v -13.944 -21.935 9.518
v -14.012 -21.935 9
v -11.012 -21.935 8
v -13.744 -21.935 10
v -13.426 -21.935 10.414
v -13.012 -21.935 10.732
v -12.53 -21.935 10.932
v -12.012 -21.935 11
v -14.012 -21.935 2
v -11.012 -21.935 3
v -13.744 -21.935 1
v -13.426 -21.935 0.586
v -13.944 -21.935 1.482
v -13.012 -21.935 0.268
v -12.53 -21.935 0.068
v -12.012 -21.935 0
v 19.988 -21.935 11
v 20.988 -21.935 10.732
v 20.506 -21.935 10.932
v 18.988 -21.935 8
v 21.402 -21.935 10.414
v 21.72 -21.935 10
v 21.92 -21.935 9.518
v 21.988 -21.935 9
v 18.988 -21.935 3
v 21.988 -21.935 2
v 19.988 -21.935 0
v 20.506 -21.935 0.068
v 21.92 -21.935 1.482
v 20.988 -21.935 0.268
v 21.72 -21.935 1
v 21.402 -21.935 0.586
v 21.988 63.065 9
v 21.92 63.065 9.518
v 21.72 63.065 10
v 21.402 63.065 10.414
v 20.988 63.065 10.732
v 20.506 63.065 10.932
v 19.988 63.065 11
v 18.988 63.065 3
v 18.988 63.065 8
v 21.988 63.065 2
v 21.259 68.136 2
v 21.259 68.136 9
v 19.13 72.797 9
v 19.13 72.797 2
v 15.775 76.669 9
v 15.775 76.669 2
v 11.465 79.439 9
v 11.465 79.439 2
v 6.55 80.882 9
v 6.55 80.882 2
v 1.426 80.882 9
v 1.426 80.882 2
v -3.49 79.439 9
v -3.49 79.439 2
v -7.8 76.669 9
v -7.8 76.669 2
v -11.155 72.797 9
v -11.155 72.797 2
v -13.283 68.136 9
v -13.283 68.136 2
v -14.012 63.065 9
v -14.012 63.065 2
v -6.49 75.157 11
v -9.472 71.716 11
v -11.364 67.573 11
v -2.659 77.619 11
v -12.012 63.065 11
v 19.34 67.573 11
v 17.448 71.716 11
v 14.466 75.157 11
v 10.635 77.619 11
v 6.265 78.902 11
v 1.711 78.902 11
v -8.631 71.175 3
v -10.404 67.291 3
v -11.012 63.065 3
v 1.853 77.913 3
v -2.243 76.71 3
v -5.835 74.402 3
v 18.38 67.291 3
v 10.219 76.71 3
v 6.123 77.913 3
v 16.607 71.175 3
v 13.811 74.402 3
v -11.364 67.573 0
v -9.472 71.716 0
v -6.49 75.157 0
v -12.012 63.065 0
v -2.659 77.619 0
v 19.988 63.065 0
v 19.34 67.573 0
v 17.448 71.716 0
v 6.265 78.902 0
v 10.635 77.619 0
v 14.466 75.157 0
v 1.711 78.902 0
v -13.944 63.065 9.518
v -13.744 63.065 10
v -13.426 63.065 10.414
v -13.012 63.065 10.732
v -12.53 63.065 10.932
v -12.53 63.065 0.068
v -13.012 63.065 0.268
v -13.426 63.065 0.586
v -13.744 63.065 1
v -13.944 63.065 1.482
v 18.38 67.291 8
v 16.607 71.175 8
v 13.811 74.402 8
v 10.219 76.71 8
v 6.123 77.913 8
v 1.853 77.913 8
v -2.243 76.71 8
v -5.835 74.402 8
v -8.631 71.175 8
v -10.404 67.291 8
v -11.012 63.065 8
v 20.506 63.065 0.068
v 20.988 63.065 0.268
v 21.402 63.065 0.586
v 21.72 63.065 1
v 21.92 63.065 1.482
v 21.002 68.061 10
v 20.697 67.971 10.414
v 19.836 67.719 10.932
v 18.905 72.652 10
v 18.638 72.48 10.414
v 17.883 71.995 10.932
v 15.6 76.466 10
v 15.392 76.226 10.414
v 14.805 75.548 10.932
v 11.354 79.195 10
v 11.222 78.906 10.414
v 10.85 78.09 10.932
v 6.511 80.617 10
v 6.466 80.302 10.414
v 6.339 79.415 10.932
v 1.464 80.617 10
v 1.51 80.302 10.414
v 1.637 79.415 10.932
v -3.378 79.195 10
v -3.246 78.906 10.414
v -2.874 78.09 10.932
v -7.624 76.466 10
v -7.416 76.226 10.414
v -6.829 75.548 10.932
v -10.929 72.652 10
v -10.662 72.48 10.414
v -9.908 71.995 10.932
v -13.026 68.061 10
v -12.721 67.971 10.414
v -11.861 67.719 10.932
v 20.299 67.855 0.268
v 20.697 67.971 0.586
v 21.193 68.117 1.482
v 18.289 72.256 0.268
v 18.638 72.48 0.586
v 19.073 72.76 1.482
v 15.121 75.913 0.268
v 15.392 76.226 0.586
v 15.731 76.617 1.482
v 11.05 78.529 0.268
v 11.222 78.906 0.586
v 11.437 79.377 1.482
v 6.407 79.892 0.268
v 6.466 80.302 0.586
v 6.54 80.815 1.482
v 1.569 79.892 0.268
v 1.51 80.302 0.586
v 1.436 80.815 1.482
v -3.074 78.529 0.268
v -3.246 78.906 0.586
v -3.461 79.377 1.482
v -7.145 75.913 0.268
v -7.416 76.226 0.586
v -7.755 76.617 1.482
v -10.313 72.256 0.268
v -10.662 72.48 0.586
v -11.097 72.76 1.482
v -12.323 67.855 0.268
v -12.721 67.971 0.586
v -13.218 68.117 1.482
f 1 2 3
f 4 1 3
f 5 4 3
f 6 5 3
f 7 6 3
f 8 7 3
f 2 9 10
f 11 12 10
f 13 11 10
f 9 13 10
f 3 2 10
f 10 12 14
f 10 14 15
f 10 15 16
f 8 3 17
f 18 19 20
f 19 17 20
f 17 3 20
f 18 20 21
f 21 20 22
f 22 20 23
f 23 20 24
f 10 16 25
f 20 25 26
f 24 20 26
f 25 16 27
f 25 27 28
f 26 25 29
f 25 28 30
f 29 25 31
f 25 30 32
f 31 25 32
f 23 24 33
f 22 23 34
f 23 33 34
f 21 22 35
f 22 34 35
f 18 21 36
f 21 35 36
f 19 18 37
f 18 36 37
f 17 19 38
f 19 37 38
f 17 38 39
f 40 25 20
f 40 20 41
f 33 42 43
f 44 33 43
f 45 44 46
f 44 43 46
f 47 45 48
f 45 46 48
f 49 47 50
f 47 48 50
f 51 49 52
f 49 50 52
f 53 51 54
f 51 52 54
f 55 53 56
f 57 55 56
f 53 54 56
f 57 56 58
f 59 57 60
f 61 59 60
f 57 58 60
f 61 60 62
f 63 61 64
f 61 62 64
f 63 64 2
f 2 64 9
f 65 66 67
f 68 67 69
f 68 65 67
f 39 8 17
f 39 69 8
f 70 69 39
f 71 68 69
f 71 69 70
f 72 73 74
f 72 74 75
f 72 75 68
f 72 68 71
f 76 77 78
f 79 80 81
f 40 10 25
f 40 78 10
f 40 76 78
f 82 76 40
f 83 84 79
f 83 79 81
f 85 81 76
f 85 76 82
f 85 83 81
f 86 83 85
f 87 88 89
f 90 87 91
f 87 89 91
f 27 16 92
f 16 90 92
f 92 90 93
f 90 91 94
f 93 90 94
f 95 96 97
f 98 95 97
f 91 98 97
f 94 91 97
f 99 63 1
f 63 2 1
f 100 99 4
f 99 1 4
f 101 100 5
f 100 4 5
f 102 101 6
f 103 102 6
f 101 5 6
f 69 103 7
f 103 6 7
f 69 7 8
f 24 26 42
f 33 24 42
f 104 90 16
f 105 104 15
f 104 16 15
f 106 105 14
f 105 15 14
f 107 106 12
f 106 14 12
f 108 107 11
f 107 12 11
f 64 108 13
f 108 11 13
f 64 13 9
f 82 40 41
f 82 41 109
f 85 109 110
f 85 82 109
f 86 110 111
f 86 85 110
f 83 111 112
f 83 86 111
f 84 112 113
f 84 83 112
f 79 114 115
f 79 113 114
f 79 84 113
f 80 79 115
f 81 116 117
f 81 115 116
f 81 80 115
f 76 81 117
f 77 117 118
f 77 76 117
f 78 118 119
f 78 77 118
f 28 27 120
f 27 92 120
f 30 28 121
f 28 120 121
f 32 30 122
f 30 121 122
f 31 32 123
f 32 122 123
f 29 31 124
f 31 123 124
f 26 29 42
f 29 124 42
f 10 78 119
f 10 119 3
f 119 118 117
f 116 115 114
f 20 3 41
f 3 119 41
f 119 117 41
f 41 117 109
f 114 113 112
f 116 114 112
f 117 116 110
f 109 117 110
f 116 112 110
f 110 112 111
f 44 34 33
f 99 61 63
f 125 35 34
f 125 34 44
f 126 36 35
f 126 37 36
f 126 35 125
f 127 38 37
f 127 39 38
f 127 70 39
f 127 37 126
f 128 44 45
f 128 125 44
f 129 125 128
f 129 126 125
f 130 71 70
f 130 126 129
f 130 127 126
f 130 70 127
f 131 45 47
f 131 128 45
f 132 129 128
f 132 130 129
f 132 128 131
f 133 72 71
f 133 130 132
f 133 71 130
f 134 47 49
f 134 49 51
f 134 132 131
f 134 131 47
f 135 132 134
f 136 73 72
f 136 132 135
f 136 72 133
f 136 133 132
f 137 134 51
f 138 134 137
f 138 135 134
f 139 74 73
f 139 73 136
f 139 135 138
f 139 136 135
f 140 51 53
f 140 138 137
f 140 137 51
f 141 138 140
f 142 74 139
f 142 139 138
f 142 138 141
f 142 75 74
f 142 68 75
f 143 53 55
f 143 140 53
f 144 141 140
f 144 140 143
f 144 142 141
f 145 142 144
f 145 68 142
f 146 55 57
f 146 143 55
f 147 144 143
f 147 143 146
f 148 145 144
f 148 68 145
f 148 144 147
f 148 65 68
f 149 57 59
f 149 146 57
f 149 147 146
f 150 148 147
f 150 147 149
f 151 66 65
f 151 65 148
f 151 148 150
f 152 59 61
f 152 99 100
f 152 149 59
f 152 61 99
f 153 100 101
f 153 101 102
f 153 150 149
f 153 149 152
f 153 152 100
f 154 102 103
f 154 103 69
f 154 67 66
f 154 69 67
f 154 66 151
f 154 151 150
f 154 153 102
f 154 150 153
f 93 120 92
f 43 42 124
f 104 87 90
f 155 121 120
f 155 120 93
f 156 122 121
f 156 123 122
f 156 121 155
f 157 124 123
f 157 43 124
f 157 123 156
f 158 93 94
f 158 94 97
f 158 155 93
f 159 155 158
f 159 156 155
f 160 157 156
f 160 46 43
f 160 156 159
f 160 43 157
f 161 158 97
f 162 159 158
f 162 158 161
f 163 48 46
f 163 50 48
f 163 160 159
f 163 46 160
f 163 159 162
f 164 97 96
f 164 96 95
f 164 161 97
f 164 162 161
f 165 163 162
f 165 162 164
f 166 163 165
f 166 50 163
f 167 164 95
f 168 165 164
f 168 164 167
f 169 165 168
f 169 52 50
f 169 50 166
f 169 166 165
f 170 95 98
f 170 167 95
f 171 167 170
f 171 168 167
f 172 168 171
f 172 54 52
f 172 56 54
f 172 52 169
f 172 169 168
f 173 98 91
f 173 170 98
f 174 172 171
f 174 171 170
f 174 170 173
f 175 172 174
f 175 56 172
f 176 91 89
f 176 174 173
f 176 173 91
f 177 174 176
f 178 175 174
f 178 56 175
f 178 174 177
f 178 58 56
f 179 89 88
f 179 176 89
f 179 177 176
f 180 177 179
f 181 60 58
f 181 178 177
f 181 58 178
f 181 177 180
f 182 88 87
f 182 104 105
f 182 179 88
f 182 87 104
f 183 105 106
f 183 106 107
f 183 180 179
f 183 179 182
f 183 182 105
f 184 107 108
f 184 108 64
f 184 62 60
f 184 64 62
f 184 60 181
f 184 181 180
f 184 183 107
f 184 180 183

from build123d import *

# Parameters (mm, degrees)
F1_DEPTH = 11
F2_T     = -3
F3_R     = 2
F4_R     = 2


with BuildPart() as f1:
    # F0 (on Top) → F1 (new body)
    with BuildSketch(Plane.XY):
        with BuildLine():
            Line((21.98791, -21.934712), (21.98791, 63.065288))
            ThreePointArc((21.98791, 63.065288), (3.98791, 81.065288), (-14.01209, 63.065288))
            Line((-14.01209, 63.065288), (-14.01209, -21.934712))
            Line((-14.01209, -21.934712), (21.98791, -21.934712))
        make_face()
    extrude(amount=F1_DEPTH)

    # F2
    f2_openings = [f1.faces().sort_by_distance(p)[0] for p in [
        (3.98791, -21.934712, 5.5),
    ]]
    offset(amount=F2_T, openings=f2_openings)

    # F3
    f3_edges = [f1.edges().sort_by_distance(p)[0] for p in [
        (-14.01209, 20.565288, 11),
        (3.98791, 81.065288, 11),
        (21.98791, 20.565288, 11),
    ]]
    fillet(f3_edges, radius=F3_R)

    # F4
    f4_edges = [f1.edges().sort_by_distance(p)[0] for p in [
        (-14.01209, 20.565288, 0),
        (21.98791, 20.565288, 0),
        (3.98791, 81.065288, 0),
    ]]
    fillet(f4_edges, radius=F4_R)


solid = f1.part
